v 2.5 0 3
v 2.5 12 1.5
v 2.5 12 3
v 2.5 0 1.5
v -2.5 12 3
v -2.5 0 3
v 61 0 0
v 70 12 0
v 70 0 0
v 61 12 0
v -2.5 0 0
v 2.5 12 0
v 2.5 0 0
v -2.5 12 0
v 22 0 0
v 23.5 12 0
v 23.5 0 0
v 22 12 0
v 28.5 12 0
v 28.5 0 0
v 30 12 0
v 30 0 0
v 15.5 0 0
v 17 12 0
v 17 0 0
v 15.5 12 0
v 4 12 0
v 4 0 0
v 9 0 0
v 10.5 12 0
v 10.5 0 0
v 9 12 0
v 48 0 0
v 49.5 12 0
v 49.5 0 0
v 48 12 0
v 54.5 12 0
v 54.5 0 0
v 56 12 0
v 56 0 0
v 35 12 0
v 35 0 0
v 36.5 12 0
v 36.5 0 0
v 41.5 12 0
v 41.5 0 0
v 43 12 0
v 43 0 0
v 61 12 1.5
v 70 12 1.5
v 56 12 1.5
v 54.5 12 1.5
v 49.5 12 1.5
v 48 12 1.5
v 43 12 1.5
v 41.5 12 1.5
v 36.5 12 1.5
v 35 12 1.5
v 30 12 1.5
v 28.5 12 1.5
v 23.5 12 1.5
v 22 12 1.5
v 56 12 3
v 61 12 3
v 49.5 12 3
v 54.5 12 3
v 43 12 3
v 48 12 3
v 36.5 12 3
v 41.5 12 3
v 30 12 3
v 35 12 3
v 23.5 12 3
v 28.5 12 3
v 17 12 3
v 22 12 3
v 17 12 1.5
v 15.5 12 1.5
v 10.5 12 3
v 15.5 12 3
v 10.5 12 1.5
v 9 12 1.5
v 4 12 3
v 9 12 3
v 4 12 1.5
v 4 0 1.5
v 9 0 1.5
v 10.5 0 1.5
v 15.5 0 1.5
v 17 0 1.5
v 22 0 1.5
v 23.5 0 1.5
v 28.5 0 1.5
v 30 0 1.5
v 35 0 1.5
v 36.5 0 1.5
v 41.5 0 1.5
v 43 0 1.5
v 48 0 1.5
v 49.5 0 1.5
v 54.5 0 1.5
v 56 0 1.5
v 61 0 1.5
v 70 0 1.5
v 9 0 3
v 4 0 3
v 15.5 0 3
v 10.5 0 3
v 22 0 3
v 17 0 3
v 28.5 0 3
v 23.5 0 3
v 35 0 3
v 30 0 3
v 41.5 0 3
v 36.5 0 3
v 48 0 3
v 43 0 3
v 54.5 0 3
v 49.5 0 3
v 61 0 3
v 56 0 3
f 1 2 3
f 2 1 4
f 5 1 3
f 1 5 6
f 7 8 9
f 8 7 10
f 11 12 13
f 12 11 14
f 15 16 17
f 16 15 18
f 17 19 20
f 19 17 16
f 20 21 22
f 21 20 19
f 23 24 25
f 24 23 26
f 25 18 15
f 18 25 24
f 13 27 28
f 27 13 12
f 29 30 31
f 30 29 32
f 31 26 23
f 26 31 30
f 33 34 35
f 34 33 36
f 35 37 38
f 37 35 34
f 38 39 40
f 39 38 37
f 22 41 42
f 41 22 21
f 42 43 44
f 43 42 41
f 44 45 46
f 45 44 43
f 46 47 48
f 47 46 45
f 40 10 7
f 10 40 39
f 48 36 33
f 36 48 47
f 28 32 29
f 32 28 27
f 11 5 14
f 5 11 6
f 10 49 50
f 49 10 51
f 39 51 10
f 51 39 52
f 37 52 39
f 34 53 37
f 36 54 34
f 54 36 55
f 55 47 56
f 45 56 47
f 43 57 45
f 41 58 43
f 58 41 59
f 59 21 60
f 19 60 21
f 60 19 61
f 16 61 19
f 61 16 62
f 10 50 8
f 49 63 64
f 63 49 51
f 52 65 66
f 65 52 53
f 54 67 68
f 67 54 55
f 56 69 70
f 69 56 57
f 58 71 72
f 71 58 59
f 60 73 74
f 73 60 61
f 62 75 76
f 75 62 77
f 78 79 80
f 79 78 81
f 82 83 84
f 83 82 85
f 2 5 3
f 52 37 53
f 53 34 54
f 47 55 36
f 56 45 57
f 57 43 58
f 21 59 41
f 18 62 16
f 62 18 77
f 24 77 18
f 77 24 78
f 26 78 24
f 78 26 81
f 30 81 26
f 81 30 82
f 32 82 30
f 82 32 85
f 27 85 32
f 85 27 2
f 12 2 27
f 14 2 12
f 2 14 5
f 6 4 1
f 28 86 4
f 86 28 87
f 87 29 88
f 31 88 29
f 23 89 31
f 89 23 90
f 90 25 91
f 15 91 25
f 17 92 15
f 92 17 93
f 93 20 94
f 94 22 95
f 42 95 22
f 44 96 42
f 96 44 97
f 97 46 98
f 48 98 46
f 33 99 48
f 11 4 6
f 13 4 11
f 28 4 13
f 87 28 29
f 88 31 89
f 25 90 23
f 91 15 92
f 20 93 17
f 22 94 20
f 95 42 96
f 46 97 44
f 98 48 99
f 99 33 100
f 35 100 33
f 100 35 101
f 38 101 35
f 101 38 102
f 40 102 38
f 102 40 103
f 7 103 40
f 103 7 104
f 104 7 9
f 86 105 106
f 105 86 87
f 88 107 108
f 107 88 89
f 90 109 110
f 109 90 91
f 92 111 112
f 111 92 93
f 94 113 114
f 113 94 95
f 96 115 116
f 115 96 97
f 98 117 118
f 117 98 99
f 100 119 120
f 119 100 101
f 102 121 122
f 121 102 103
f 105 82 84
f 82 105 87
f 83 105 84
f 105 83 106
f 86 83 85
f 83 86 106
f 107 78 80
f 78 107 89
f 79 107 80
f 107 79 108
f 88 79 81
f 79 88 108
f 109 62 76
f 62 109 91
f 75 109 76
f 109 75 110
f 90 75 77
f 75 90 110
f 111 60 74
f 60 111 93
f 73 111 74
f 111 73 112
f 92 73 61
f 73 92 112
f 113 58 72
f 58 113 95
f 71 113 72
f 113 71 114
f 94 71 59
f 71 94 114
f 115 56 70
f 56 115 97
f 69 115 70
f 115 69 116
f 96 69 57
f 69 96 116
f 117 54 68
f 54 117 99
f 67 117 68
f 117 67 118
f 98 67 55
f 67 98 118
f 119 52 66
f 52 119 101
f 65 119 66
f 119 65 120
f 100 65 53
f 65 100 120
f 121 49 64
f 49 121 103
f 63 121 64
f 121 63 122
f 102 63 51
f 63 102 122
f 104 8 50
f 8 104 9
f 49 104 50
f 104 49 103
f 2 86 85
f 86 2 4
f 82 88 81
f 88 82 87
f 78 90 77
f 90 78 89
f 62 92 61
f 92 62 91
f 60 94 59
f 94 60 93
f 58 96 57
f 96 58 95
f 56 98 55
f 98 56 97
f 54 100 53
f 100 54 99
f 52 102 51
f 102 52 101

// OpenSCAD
// Agarose gel comb - a flat plate with a back bar and a row of rectangular teeth, for casting
// horizontal gels. NOVEL general part.
//

cols   = 10;
teeth_d = 5.0;
teeth_l = 12;
pitch  = 1.5;
base_t = 1.5;
back_w = 12;

$fn = 48;

P = max(pitch, teeth_d + 1.5);                 // keep a material wall between teeth
L = 70;                                        // spine length (X)
w = back_w;                                    // spine width (Y)
t = base_t;                                    // plate thickness (Z)

overhang = min(1.5, P / 2 - 0.5);              // the tooth tip projects past the spine edge

difference() {
    union() {
        cube([L, w, t]);                       // spine (back bar)
        for (i = [0 : cols - 1])
            translate([-(teeth_d / 2) + i * P, 0, 0]) cube([teeth_d, teeth_l, t + overhang]);   // teeth
    }
    for (i = [0 : cols - 1])
        translate([-(teeth_d / 2) + i * P, 0, -1]) cube([teeth_d, teeth_l + 2, 1]);           // pocket for each tooth
}
